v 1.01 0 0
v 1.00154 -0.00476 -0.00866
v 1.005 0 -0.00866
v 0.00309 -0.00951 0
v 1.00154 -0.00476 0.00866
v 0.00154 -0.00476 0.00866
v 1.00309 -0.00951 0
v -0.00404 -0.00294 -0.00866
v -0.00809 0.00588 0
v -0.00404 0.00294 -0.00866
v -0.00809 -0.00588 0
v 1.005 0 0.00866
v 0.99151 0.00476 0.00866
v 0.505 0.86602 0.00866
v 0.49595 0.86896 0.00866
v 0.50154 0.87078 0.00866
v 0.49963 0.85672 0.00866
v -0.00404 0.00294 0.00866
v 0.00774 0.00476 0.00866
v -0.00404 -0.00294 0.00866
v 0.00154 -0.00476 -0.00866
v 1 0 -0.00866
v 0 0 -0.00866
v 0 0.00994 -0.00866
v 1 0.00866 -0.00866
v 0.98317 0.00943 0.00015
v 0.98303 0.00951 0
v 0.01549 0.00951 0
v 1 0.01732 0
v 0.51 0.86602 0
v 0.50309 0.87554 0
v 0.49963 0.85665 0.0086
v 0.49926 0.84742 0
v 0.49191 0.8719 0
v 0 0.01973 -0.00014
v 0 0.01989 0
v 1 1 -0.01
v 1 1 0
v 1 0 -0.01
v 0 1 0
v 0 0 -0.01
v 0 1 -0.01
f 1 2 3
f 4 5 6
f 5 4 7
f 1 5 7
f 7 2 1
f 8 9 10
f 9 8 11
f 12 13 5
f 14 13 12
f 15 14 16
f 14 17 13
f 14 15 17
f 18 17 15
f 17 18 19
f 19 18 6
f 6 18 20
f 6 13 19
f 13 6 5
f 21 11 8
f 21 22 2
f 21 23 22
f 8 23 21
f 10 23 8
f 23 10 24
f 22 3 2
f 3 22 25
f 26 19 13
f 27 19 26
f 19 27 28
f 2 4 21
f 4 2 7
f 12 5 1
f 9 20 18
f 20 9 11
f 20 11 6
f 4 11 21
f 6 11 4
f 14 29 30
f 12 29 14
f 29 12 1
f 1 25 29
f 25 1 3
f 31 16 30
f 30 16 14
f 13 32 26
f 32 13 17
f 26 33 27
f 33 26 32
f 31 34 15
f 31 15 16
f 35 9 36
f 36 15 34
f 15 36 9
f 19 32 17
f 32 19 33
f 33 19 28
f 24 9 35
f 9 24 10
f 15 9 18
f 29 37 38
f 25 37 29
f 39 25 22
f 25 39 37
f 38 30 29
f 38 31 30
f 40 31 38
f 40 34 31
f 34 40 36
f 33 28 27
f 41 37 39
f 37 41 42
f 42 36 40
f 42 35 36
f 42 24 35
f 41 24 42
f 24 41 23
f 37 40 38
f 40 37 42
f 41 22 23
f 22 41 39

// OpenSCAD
hull(){
    translate([0, 0]) sphere(0.01);
    translate([1, 0]) sphere(0.01);
}
hull(){
    translate([1, 0]) sphere(0.01);
    translate([0.5, 0.8660254037844386]) sphere(0.01);
}
hull(){
    translate([0.5, 0.8660254037844386]) sphere(0.01);
    translate([0, 0]) sphere(0.01);
}
translate([0,0,-0.01]) color([0.1,0.1,0.1]) cube([1,1,0.01]);
